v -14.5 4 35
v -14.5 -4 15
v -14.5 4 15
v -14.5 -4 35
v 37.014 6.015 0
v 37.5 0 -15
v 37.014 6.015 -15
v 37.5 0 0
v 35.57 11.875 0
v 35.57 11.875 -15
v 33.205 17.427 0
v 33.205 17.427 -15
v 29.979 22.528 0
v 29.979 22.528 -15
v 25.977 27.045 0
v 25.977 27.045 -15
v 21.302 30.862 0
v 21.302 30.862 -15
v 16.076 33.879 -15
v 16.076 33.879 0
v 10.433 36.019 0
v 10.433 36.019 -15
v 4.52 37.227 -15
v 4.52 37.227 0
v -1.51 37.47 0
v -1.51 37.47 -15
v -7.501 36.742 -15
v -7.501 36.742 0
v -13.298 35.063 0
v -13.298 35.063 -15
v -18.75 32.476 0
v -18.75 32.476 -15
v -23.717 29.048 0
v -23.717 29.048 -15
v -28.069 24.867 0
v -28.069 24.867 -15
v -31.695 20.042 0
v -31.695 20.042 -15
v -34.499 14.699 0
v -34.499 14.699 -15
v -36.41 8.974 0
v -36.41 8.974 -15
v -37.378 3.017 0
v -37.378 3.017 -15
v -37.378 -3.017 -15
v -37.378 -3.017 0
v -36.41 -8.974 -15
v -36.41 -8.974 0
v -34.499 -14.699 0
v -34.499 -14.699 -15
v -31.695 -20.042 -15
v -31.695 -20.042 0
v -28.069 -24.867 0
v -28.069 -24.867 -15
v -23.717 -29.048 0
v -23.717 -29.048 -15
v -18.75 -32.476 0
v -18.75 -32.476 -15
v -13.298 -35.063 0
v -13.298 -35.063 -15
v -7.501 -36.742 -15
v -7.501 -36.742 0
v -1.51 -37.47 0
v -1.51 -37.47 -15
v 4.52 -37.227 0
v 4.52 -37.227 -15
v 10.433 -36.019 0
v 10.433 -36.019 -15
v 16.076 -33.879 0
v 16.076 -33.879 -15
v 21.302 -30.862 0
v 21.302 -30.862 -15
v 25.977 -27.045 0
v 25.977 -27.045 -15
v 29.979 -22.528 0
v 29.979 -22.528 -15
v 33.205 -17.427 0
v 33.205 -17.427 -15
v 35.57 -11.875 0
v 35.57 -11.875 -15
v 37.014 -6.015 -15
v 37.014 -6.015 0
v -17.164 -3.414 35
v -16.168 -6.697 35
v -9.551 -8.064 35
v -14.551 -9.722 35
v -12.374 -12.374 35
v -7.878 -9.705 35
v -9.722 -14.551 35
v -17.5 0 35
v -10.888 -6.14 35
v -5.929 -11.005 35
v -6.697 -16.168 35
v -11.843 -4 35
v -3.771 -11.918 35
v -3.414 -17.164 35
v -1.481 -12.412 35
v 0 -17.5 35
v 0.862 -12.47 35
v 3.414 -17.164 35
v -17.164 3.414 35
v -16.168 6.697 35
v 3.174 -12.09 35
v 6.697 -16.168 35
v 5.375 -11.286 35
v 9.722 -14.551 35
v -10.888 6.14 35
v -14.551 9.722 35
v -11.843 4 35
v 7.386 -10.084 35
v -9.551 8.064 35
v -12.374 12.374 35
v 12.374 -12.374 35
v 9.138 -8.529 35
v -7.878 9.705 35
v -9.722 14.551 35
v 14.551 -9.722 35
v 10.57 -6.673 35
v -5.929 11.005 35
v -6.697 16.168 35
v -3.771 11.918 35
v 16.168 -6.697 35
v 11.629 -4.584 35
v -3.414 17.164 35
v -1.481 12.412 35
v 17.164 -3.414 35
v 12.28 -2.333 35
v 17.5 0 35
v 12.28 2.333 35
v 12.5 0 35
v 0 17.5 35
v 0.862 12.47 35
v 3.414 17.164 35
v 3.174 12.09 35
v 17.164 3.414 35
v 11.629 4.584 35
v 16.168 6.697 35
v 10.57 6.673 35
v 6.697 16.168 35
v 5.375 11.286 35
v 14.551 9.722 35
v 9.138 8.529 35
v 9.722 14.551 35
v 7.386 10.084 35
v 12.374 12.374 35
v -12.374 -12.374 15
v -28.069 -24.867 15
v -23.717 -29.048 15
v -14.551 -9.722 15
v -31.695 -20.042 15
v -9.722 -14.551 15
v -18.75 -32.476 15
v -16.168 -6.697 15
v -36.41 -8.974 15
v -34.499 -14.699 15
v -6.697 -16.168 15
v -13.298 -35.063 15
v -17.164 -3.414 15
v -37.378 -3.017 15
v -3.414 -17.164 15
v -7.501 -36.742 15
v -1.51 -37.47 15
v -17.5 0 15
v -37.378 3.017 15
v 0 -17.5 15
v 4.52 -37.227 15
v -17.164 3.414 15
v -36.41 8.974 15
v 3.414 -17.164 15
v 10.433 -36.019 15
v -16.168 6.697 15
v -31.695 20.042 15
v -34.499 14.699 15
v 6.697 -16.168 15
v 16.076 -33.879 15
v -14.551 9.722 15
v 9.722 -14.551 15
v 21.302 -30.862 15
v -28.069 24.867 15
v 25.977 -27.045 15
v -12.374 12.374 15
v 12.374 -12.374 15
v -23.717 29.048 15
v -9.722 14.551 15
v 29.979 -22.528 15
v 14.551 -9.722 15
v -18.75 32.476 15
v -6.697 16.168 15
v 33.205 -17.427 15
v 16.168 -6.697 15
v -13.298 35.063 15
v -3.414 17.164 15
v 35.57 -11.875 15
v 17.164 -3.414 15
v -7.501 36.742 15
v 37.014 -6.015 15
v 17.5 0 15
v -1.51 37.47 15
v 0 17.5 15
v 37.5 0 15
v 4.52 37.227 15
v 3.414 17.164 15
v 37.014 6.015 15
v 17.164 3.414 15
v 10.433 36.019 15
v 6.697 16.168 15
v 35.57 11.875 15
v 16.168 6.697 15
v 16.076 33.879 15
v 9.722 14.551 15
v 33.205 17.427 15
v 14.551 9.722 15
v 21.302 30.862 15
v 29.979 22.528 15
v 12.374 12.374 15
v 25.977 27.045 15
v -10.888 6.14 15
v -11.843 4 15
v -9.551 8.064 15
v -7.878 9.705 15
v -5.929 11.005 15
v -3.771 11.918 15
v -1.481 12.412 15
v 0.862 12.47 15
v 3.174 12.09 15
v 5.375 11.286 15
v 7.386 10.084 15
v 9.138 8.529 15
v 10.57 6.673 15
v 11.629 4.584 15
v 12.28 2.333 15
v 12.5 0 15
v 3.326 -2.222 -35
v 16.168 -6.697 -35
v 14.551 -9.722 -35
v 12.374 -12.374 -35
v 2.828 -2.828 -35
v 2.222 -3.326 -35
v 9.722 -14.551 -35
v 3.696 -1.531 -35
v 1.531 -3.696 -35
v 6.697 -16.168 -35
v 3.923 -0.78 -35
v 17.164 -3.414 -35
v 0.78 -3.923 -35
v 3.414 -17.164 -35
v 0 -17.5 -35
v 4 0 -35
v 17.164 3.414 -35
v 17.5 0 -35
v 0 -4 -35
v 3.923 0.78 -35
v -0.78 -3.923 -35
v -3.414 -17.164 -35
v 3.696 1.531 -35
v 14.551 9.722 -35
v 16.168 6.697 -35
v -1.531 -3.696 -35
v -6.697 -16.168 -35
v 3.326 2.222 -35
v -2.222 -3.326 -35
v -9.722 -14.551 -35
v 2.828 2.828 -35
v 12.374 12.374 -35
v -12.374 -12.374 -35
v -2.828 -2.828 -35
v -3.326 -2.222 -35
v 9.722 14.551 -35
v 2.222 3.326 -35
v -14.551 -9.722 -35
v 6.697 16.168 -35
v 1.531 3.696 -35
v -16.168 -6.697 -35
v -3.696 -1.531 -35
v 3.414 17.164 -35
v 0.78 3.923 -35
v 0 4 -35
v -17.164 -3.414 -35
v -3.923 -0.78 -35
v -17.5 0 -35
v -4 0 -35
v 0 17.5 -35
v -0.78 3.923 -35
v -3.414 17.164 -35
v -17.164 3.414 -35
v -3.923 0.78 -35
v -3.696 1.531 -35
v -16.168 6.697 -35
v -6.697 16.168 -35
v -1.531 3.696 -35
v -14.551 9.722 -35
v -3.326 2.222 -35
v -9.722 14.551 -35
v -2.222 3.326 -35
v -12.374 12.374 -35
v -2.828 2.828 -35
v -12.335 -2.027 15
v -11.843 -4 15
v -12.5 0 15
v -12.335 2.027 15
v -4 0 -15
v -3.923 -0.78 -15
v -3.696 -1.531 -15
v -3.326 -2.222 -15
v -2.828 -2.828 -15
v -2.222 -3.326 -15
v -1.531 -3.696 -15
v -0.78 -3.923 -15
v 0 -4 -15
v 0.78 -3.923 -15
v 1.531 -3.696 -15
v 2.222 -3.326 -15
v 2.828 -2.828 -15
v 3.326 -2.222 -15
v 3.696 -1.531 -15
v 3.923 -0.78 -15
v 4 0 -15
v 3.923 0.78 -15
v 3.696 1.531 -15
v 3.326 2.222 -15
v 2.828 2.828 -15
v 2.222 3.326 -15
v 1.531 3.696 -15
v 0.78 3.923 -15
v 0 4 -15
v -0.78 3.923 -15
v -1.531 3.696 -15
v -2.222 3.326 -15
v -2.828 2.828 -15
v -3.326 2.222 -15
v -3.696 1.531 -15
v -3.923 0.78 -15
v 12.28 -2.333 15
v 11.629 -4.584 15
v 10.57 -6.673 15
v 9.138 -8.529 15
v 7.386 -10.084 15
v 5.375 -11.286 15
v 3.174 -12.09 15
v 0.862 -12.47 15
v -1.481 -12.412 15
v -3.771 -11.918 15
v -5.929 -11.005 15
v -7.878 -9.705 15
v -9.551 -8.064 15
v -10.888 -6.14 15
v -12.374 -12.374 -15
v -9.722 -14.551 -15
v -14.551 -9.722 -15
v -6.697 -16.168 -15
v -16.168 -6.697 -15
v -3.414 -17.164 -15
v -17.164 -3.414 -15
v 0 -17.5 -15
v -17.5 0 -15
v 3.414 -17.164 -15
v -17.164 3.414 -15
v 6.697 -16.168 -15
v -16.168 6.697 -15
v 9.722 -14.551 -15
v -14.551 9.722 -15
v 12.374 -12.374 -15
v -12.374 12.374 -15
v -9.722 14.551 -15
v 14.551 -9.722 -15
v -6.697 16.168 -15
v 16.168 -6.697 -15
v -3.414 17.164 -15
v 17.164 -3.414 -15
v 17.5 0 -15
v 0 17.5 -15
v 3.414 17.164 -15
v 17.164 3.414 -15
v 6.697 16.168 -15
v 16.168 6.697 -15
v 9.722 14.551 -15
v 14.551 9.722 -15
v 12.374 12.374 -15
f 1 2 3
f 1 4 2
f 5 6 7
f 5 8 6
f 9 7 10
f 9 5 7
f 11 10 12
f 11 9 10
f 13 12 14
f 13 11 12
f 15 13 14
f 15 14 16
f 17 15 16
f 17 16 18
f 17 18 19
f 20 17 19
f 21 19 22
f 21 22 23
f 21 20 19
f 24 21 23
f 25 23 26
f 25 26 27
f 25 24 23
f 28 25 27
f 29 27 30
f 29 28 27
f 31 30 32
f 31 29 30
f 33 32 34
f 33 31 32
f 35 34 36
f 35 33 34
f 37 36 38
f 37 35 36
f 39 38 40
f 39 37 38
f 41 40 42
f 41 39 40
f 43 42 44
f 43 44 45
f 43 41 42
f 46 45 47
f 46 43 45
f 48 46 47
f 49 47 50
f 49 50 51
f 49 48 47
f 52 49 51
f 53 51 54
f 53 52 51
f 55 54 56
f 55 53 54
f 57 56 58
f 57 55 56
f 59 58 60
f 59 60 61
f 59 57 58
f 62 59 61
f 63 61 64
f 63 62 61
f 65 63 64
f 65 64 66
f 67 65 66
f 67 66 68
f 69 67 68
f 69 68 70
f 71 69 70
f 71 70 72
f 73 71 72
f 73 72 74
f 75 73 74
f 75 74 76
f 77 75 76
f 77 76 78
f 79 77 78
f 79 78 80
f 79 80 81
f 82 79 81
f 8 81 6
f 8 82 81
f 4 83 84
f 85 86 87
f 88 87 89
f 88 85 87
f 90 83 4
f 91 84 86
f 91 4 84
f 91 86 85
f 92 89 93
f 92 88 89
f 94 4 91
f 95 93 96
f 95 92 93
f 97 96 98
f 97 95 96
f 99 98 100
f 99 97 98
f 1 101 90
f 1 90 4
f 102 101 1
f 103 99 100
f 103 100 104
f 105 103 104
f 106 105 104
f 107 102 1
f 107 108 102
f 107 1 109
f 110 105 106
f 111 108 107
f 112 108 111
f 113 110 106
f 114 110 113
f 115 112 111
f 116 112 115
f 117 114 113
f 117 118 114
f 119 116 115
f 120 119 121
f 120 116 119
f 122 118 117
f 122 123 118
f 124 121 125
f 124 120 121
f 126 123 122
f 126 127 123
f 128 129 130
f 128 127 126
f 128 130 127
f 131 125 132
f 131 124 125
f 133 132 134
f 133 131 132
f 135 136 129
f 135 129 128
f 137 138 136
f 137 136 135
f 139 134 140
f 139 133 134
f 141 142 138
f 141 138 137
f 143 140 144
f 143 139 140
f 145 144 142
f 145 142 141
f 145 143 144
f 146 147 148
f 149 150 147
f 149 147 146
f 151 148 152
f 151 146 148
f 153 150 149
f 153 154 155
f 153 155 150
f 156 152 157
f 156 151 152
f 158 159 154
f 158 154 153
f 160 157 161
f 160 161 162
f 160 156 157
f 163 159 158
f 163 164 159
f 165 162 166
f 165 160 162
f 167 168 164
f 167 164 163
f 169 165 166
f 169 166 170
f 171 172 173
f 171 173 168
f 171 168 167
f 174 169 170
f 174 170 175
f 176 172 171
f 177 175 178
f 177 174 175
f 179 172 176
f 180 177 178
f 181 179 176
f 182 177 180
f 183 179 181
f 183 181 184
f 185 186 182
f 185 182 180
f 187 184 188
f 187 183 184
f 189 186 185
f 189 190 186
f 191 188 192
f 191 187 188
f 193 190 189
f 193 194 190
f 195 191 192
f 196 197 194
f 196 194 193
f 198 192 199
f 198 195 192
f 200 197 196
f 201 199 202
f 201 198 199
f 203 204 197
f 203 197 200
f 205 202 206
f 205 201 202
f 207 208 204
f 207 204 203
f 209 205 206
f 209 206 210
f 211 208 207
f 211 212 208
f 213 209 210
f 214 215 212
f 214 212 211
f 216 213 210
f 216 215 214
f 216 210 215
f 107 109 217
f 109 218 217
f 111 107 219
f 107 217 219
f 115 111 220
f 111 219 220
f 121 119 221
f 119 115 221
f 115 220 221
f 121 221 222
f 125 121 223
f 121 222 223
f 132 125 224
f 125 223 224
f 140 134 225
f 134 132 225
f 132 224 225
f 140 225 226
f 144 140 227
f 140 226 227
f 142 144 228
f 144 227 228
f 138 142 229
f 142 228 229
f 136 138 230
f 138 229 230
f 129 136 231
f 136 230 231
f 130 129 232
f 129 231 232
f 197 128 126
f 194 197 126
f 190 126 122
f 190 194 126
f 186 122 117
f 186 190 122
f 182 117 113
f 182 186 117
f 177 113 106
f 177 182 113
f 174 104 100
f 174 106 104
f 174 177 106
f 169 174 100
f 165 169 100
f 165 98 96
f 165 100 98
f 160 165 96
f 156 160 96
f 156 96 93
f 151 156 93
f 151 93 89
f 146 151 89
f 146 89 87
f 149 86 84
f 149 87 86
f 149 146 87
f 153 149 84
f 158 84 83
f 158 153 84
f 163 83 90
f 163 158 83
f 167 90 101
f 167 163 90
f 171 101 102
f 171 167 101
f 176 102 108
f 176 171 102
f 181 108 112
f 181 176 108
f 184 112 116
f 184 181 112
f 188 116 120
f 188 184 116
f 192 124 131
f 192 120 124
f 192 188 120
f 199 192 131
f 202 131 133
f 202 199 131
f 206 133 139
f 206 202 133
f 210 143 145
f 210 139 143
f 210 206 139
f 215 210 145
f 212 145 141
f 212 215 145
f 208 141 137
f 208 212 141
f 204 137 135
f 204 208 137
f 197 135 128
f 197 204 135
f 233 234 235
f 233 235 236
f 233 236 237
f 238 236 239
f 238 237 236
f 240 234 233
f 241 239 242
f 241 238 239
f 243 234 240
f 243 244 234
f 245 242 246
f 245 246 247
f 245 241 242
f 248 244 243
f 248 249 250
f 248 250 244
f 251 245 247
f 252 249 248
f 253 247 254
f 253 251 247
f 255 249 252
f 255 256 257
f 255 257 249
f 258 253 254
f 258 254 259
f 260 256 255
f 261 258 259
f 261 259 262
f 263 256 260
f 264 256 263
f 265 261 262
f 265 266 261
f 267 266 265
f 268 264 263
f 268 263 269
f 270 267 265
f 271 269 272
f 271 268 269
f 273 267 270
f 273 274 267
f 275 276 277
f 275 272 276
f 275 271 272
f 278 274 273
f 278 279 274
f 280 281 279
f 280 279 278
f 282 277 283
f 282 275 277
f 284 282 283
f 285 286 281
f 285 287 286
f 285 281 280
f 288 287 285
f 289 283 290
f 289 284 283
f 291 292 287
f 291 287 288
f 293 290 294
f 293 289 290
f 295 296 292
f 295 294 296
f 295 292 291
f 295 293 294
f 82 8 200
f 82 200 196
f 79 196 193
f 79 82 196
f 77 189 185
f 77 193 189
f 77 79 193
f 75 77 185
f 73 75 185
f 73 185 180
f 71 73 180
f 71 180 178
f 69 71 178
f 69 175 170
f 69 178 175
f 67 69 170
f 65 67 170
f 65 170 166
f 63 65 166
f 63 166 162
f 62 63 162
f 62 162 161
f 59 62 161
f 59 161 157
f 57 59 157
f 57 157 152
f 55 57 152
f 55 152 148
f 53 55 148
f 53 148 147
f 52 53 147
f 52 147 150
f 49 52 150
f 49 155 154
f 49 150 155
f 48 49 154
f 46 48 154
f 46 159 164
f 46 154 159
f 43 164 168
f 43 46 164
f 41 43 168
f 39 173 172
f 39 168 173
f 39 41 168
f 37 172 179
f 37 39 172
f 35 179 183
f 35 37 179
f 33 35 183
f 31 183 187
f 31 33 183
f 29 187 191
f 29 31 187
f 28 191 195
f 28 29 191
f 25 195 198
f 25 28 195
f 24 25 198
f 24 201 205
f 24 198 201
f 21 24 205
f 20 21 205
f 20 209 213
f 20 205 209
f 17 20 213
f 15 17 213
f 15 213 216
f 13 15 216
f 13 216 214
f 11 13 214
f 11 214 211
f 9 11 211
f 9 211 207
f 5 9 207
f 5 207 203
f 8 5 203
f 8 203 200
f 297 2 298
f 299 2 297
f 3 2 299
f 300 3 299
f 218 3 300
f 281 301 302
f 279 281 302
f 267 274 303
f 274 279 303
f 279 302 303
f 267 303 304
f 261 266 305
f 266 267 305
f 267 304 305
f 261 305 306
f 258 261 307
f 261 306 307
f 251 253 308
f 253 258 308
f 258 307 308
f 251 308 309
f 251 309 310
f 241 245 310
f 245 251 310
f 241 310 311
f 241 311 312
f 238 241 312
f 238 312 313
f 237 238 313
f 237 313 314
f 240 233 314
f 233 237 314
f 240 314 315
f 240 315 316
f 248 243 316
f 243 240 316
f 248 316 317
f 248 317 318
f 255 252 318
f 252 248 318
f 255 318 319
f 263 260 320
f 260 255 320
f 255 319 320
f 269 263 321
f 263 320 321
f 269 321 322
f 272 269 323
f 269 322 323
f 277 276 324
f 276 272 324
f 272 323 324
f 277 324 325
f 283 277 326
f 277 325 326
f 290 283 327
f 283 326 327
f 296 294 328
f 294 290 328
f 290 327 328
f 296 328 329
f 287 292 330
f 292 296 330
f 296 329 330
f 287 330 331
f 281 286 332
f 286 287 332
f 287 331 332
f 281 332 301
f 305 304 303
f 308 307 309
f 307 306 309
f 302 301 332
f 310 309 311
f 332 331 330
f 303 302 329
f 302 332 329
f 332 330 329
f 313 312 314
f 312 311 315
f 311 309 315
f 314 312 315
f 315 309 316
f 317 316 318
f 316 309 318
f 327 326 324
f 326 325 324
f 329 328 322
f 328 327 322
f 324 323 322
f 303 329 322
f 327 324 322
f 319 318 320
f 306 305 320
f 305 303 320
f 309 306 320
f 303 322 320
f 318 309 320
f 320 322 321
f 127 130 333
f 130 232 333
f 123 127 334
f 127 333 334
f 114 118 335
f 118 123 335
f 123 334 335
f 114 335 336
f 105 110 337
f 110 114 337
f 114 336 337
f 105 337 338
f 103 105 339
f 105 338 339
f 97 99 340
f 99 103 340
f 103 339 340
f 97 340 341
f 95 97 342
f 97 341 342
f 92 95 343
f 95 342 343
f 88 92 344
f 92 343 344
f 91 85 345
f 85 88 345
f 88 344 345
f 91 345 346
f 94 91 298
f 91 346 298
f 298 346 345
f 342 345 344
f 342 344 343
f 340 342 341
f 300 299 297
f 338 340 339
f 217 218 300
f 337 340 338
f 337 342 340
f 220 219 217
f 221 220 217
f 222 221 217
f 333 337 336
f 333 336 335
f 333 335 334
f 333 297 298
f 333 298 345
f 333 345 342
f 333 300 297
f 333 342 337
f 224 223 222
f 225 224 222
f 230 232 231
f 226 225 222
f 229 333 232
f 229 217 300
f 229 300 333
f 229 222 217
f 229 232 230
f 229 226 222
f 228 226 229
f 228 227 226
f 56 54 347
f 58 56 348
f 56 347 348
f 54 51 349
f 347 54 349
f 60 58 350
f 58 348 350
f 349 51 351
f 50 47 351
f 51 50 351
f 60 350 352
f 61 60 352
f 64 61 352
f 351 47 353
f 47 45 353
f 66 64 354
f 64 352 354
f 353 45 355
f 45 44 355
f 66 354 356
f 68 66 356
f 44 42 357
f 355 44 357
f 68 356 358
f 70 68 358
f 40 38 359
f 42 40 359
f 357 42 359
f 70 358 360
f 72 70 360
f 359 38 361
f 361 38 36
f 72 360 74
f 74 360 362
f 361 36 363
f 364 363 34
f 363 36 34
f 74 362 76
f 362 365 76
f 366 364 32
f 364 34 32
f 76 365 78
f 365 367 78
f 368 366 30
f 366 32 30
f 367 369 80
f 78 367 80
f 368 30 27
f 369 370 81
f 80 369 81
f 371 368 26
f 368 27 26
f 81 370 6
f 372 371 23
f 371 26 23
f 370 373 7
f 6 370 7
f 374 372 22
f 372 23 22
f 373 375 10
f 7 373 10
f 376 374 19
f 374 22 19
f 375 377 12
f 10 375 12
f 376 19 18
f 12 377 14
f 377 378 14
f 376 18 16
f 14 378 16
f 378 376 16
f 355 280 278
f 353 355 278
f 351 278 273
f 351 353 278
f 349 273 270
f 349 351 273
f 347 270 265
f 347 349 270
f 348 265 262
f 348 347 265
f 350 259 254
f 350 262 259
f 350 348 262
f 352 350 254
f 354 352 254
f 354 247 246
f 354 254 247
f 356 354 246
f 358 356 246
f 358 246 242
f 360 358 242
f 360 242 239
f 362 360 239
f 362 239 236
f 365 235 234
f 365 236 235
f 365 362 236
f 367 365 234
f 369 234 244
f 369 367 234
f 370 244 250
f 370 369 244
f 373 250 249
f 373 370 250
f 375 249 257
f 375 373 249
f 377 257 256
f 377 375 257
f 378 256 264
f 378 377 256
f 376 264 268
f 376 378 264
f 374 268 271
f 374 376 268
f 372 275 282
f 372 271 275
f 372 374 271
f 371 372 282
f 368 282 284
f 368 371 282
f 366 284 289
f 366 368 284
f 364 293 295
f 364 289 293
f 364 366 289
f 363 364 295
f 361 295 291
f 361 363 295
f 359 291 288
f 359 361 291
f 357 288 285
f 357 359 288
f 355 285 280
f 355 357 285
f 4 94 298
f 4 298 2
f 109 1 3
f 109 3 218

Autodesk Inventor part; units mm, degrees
ref_plane "YZ Plane" through (0, 0, 0) normal (1, 0, 0) x (0, 1, 0)
ref_plane "XZ Plane" through (0, 0, 0) normal (0, 1, 0) x (-1, 0, 0)
ref_plane "XY Plane" through (0, 0, 0) normal (0, 0, 1) x (1, 0, 0)
sketch "Sketch1" plane through (0, 0, 0) normal (0, 0, 1) x (1, 0, 0)
  circle A0 centre (0, 0) radius 37.5
  dimension "d0" = 75
extrude "Extrusion1" add sketch "Sketch1" along normal mid plane 30
sketch "Sketch2" plane through (0, 0, 15) normal (0, 0, 1) x (1, 0, 0)
  circle A0 centre (0, 0) radius 17.5
  circle A1 centre (0, 0) radius 12.5
  dimension "d3" = 35
  dimension "d4" = 25
extrude "Extrusion2" add sketch "Sketch2" along normal blind 20
sketch "Sketch3" plane through (0, 0, 35) normal (0, 0, 1) x (1, 0, 0)
  line L0 (-10.5, -4) -> (-14.5, -4)
  line L1 (-14.5, -4) -> (-14.5, 4)
  line L2 (-14.5, 4) -> (-10.5, 4)
  line L3 (-10.5, 4) -> (-10.5, -4)
  circle A0 centre (0, 0) radius 12.5 projected
  line L4 (-10.5, -4) -> (-14.5, 4) construction
  line L5 (-14.5, -4) -> (-10.5, 4) construction
  point P0 (-12.5, 0)
  point P1 (-11.8427, -4)
  point P2 (-11.8427, 4)
  dimension "d7" = 4
  dimension "d8" = 8
extrude "Extrusion3" cut sketch "Sketch3" against normal blind 20 contours L0 L1 L2 A0
sketch "Sketch4" plane through (0, 0, -15) normal (0, 0, -1) x (-1, 0, 0)
  circle A0 centre (0, 0) radius 17.5
  circle A1 centre (0, 0) radius 4
  dimension "d11" = 8
extrude "Extrusion4" add sketch "Sketch4" along normal blind 20
sketch "Sketch5" plane through (0, 0, -35) normal (0, 0, -1) x (-1, 0, 0)
  point P0 (0, 0)
properties part number "pump and e-motor coupling"
